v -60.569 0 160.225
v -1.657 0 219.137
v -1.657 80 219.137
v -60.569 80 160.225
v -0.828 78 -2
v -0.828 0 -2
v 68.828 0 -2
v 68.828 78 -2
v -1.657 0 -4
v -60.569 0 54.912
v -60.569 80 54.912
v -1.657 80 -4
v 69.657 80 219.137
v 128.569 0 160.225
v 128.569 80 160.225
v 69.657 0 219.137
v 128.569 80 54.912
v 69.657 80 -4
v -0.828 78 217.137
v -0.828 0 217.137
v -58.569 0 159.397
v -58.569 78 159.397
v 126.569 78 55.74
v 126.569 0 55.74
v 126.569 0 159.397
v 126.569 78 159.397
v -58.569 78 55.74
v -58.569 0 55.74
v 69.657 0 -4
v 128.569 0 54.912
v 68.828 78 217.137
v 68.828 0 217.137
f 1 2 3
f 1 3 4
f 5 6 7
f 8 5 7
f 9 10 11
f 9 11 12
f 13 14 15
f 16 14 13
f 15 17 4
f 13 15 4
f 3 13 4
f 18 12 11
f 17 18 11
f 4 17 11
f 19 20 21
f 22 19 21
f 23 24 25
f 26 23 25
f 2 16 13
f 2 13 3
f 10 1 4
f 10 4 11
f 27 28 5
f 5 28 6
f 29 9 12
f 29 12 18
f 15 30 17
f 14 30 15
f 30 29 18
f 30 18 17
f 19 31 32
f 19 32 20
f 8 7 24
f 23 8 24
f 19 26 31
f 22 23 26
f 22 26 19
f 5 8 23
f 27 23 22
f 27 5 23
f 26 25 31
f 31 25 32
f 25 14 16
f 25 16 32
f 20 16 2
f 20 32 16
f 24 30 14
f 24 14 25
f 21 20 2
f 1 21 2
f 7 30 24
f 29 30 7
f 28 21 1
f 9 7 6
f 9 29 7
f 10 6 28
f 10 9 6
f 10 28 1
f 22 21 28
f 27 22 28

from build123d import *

# Parameters (mm, degrees)
EXTRUDE_3_DEPTH     = 80
CUT_EXTRUDE_1_DEPTH = 78


with BuildPart() as part:
    # 草图1 → 凸台-拉伸3 (new body)
    with BuildSketch(Plane(origin=(0, 0, 0), x_dir=(1, 0, 0), z_dir=(0, 1, 0))):
        Polygon((-1.656854249, 4), (69.656854249, 4), (128.568542495, -54.911688245), (128.568542495, -160.225396744), (69.656854249, -219.13708499), (-1.656854249, -219.13708499), (-60.568542495, -160.225396744), (-60.568542495, -54.911688245), align=None)
    extrude(amount=EXTRUDE_3_DEPTH)

    # 草图1<6> → 切除-拉伸1 (cut)
    with BuildSketch(Plane(origin=(0, 0, 0), x_dir=(1, 0, 0), z_dir=(0, 1, 0))):
        Polygon((-58.568542495, -55.74011537), (-0.828427125, 2), (68.828427125, 2), (126.568542495, -55.74011537), (126.568542495, -159.39696962), (68.828427125, -217.13708499), (-0.828427125, -217.13708499), (-58.568542495, -159.39696962), align=None)
    extrude(amount=CUT_EXTRUDE_1_DEPTH, mode=Mode.SUBTRACT)


solid = part.part
